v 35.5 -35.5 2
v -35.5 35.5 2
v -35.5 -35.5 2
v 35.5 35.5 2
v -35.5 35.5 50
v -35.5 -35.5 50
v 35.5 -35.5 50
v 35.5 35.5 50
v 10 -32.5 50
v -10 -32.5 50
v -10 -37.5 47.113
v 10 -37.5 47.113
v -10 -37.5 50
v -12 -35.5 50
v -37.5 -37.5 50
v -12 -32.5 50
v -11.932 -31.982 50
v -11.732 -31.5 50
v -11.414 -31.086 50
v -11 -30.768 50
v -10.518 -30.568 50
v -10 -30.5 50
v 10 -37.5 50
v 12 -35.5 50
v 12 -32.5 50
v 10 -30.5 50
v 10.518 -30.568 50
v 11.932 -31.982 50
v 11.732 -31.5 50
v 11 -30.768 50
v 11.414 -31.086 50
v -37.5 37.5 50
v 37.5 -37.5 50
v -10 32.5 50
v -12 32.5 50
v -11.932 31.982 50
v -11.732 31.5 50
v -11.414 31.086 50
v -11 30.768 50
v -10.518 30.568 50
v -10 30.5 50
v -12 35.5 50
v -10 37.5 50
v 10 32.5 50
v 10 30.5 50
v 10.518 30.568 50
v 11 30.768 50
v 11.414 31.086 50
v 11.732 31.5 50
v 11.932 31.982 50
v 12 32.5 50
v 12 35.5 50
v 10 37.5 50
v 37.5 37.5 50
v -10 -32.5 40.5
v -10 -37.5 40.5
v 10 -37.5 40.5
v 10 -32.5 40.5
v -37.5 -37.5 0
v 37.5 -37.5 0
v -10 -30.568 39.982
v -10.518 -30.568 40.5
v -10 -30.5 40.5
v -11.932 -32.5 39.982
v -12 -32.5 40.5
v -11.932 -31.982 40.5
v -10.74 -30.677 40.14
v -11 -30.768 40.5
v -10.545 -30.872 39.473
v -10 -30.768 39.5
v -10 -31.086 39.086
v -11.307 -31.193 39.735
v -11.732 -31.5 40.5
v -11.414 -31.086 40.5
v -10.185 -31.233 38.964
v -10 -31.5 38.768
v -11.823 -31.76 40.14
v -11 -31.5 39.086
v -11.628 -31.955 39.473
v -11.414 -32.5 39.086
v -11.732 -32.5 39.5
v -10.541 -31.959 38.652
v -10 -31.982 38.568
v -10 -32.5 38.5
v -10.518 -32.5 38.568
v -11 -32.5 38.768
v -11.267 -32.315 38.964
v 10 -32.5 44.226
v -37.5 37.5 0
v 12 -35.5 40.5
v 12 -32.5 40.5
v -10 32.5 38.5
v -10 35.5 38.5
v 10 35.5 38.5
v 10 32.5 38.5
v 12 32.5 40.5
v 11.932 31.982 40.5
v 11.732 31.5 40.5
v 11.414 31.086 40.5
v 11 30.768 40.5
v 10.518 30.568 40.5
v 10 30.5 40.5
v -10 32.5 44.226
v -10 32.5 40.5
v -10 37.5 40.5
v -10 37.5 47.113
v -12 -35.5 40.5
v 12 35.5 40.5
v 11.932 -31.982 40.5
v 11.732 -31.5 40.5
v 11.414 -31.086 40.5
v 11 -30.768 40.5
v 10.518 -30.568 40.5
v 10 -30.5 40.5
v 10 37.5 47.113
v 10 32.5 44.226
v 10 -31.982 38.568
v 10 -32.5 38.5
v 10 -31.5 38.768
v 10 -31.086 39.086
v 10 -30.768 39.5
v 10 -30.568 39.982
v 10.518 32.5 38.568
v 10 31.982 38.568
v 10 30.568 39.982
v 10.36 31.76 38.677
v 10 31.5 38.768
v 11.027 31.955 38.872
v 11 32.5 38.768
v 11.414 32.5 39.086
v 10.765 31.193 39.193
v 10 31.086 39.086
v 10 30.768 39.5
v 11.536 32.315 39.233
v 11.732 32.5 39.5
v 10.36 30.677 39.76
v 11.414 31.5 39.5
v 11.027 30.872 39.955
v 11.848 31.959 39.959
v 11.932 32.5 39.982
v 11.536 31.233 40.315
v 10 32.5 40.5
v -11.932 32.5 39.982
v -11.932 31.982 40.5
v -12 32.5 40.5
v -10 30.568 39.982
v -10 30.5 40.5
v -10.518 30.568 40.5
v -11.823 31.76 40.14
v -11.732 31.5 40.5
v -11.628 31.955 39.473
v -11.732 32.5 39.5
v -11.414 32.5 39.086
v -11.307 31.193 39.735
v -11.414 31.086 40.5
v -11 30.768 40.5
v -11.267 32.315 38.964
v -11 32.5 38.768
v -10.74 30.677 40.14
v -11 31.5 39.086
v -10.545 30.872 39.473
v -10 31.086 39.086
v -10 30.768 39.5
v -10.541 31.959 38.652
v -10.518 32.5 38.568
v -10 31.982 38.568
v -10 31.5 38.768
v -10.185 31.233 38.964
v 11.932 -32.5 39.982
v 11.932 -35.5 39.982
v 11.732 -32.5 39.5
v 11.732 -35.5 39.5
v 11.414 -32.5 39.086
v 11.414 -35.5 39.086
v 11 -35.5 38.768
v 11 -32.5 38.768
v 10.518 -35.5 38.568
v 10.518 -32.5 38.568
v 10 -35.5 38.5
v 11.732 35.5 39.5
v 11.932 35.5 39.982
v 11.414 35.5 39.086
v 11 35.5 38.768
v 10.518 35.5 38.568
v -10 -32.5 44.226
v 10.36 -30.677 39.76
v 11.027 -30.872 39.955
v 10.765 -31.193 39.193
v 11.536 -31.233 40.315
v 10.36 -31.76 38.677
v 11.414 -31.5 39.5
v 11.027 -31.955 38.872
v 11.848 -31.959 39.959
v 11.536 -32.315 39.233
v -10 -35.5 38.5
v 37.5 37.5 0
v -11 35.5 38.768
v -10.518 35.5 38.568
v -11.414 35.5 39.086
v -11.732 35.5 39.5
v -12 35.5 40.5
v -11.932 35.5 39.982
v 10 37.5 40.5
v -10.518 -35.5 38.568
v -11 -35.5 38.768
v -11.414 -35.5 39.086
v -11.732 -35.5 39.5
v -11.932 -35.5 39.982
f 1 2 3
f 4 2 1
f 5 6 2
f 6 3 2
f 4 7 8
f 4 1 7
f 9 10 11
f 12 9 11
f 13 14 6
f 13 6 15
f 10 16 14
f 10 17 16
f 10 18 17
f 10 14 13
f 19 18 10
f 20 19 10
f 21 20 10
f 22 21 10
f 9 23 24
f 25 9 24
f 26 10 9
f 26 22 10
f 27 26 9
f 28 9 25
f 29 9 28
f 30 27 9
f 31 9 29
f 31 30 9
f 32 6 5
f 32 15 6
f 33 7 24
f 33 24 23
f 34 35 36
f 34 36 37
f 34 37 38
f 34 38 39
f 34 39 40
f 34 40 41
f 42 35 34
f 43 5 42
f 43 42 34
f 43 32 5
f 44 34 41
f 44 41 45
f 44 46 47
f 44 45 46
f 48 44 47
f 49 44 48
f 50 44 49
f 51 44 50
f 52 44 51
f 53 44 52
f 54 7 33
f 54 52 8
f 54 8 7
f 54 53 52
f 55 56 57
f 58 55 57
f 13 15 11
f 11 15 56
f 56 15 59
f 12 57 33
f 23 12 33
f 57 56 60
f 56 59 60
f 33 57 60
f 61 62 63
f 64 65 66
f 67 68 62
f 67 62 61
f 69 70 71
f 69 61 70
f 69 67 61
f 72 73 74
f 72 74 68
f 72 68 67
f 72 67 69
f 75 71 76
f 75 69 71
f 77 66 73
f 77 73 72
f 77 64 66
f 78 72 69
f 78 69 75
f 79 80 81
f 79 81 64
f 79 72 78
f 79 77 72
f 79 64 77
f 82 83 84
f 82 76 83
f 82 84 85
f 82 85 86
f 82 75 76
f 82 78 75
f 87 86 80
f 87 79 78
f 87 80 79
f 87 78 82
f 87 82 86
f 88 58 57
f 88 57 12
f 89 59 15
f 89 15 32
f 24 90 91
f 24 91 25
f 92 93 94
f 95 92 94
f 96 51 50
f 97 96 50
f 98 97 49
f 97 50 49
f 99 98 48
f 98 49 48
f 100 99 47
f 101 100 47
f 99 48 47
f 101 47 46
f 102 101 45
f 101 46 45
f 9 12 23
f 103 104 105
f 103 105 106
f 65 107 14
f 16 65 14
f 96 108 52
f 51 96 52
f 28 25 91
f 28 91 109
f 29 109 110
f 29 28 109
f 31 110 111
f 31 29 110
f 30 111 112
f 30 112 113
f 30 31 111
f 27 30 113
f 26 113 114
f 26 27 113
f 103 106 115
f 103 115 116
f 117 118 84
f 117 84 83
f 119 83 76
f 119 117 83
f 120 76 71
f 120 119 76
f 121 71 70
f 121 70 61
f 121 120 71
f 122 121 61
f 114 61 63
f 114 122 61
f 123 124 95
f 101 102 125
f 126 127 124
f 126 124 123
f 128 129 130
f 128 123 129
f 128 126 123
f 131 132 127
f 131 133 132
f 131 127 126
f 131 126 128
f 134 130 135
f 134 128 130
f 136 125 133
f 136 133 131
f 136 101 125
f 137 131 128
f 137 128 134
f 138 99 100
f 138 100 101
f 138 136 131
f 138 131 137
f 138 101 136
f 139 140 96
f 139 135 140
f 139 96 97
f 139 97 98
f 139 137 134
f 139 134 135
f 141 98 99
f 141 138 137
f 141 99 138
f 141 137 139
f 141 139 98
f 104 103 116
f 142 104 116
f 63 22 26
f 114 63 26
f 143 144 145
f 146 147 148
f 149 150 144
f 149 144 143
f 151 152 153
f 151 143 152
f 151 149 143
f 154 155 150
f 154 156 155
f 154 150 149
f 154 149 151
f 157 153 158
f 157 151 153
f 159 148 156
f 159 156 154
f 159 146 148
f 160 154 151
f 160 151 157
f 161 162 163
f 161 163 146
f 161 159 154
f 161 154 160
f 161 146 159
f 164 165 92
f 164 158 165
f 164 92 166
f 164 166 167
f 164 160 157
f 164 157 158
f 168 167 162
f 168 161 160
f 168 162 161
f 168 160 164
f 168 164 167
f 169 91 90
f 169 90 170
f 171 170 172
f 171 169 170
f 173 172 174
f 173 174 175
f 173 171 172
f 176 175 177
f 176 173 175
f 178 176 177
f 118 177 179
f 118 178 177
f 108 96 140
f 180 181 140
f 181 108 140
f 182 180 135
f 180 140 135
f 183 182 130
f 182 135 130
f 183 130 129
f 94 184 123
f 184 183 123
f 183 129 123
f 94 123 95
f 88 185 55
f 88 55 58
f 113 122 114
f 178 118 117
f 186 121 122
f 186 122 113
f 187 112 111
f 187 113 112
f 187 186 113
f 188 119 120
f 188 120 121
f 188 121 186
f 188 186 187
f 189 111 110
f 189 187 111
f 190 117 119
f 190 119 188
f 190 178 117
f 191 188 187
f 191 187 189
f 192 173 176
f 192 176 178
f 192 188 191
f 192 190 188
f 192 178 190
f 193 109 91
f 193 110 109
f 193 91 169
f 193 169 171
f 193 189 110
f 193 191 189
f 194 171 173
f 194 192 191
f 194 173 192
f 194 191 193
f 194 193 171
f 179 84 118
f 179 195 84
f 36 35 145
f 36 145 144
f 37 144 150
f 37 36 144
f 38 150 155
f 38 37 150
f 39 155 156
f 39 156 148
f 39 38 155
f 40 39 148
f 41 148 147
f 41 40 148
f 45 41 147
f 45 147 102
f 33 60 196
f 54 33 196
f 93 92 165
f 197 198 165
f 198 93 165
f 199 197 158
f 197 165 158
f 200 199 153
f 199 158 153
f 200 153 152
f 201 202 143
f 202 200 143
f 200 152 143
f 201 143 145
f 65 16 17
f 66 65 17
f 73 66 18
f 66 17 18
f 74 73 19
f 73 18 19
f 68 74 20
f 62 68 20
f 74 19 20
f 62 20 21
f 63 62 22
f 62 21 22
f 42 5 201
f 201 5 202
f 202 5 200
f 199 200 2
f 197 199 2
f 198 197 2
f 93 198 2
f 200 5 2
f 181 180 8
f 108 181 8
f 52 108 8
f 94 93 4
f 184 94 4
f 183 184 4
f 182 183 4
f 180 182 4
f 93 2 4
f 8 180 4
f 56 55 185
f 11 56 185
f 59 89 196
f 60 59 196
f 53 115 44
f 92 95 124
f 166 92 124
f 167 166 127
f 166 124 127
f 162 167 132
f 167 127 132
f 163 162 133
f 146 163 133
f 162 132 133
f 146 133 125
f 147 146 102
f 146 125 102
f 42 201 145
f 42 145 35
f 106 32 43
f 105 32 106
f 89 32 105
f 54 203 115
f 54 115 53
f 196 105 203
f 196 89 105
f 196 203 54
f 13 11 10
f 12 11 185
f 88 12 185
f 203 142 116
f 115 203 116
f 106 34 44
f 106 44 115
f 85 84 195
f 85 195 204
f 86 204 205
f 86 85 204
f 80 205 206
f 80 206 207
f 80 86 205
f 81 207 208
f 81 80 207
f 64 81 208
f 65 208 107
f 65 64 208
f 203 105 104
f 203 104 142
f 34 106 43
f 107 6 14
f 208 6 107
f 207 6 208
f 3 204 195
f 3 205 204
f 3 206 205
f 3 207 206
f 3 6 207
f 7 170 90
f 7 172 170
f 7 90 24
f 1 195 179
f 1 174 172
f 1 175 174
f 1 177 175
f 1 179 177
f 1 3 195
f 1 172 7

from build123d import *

# Parameters (mm, degrees)
SKETCH_W     = 75
SKETCH_H     = 75
PAD_DEPTH    = 50
SKETCH001_W  = 20
SKETCH001_H  = 10
POCKET_DEPTH = 5
THICKNESS_T  = -2
PAD001_DEPTH = 20


with BuildPart() as part:
    # Sketch → Pad (new body)
    with BuildSketch(Plane.XY):
        Rectangle(SKETCH_W, SKETCH_H)
    extrude(amount=PAD_DEPTH)

    # Sketch001 (on Face2 of Pad) → Pocket (cut)
    with BuildSketch(Plane.XZ.offset(37.5)):
        with Locations((0, 45.5)):
            Rectangle(SKETCH001_W, SKETCH001_H)
    pocket = extrude(amount=-POCKET_DEPTH, mode=Mode.SUBTRACT)

    # Mirrored: Pocket across XZ
    add(pocket.mirror(Plane.XZ), mode=Mode.SUBTRACT)

    # Thickness
    thickness_openings = [part.faces().sort_by_distance(p)[0] for p in [
        (0, 0, 50),
    ]]
    offset(amount=THICKNESS_T, openings=thickness_openings)

    # Sketch002 (on Face11 of Thickness) → Pad001 (join)
    with BuildSketch(Plane.YZ.offset(-10)):
        Polygon((-32.5, 50), (-37.5, 47.113249), (-32.5, 44.226497), align=None)
    pad001 = extrude(amount=PAD001_DEPTH)

    # Mirrored001: Pad001 across XZ
    add(pad001.mirror(Plane.XZ))


solid = part.part
